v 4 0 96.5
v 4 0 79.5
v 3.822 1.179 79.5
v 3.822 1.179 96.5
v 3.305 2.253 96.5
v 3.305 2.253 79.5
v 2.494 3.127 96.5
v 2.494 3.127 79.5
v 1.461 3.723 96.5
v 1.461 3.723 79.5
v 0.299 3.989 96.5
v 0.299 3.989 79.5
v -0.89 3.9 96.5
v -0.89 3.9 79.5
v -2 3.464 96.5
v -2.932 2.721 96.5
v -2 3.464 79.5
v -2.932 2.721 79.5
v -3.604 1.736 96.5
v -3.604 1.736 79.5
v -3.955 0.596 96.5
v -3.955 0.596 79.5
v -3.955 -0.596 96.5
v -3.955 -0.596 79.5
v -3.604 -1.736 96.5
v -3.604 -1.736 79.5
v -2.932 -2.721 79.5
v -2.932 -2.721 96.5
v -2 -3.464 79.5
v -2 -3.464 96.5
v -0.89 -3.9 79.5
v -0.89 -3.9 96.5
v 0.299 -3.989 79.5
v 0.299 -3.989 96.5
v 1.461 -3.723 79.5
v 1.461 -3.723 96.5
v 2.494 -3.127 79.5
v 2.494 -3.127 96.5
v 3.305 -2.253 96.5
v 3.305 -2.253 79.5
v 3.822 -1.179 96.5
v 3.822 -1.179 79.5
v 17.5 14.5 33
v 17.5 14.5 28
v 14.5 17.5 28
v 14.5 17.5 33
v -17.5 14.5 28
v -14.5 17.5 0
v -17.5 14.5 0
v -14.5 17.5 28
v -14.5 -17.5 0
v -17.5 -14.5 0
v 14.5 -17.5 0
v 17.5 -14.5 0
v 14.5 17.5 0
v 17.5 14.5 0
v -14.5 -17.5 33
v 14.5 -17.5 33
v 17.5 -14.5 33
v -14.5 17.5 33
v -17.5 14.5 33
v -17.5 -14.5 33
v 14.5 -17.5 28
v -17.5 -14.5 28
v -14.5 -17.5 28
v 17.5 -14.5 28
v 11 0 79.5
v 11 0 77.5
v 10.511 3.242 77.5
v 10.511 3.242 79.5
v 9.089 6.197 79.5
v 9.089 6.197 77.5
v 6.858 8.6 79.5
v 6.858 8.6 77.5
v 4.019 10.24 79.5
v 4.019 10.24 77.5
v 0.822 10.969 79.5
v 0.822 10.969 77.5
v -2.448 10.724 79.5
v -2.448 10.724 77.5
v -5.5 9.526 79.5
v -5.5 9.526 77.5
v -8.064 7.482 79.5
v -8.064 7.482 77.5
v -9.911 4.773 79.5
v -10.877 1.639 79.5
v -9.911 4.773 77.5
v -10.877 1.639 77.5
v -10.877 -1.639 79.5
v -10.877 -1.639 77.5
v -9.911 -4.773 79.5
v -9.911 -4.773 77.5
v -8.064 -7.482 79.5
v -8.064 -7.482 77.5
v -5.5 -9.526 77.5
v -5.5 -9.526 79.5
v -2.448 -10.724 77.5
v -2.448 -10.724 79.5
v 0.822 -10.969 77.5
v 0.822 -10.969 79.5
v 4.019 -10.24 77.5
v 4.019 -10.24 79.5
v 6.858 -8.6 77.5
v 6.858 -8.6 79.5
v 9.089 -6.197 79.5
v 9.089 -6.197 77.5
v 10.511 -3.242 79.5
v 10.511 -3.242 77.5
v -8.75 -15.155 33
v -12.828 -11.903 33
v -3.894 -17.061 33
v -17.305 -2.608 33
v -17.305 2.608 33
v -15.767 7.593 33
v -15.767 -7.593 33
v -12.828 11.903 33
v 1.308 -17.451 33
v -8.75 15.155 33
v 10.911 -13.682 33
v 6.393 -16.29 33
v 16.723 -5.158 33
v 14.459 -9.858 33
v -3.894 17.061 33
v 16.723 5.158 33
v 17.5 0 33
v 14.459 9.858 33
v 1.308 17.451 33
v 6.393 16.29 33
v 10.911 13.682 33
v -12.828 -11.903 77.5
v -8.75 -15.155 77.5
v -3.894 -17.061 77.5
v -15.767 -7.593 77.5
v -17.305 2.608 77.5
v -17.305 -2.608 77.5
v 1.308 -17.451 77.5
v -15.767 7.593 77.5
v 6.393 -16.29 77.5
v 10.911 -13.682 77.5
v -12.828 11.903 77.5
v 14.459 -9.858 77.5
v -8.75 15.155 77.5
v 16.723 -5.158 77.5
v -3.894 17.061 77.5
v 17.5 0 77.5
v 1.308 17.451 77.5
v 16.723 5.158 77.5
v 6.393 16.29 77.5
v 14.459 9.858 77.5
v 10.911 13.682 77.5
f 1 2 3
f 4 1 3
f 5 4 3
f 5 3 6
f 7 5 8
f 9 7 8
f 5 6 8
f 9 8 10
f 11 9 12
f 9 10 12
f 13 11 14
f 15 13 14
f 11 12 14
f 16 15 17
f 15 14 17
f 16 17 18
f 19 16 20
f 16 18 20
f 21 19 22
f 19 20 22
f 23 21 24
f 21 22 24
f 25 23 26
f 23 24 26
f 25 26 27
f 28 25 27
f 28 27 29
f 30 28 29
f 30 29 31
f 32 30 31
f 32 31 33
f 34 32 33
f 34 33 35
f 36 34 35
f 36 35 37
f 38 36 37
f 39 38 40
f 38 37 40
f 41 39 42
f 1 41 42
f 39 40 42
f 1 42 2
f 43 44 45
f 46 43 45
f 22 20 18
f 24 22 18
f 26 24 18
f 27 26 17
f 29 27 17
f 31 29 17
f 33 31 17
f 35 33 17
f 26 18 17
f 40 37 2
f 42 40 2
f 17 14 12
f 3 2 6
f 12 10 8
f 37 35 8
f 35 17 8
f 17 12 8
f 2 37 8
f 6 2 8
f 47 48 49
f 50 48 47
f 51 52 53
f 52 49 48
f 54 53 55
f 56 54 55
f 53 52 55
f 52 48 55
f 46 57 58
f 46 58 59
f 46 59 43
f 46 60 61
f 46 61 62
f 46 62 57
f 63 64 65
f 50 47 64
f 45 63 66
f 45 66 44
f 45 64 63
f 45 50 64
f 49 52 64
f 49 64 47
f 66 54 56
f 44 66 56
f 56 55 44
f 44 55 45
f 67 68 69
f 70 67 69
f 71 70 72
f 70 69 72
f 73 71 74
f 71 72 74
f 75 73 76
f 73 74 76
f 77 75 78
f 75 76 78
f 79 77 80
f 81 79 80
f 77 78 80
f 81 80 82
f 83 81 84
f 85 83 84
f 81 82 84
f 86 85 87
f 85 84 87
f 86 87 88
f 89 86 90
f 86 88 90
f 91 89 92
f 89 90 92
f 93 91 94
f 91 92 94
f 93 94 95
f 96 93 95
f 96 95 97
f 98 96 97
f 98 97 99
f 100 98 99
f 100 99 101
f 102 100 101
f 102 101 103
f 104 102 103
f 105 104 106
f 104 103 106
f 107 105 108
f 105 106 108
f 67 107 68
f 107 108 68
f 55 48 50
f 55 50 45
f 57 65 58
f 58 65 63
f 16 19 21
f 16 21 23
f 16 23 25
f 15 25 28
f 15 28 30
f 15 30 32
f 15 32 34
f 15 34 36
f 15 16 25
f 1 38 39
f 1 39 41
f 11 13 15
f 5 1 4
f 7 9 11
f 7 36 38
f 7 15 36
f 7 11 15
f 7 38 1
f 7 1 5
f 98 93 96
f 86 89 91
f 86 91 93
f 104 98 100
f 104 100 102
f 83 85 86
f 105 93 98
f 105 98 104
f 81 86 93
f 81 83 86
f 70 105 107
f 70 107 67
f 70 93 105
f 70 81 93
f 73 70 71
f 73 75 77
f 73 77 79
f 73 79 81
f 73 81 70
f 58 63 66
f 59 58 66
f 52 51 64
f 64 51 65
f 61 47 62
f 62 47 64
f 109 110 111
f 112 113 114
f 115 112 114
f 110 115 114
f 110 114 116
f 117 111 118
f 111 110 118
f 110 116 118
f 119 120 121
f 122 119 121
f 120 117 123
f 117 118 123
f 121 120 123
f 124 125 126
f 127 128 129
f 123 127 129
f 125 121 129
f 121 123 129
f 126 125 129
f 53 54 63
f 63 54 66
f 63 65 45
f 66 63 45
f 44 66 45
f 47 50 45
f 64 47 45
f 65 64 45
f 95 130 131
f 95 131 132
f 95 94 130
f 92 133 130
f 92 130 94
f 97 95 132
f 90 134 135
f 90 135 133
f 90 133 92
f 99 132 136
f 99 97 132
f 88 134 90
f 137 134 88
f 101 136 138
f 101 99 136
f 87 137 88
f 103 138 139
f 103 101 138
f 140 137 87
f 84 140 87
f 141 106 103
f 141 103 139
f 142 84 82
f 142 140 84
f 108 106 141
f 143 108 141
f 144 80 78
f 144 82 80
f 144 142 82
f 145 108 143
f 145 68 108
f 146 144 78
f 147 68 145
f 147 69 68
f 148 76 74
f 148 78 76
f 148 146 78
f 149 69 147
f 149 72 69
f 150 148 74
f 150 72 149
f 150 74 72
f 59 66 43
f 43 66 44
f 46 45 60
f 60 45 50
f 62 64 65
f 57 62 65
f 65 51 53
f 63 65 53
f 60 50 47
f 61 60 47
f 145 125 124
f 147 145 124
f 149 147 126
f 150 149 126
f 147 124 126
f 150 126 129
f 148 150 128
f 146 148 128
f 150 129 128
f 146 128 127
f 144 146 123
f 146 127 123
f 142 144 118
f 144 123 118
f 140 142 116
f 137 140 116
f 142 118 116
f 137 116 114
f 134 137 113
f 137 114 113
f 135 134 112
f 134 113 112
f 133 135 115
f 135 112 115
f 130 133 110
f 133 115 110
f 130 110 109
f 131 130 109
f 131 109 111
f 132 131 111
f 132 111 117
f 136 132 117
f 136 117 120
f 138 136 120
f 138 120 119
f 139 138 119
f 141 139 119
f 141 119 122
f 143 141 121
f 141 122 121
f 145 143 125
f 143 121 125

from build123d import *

# Parameters (mm, degrees)
SKETCH1_W           = 35
SKETCH1_H           = 35
BOSS_EXTRUDE1_DEPTH = 28
CHAMFER1_SIZE       = 3
BOSS_EXTRUDE2_DEPTH = 5
SKETCH3_R           = 17.5
BOSS_EXTRUDE3_DEPTH = 44.5
SKETCH4_R           = 11
BOSS_EXTRUDE4_DEPTH = 2
SKETCH5_R           = 4
BOSS_EXTRUDE5_DEPTH = 17


with BuildPart() as part:
    # Sketch1 → Boss-Extrude1 (new body)
    with BuildSketch(Plane.XY):
        Rectangle(SKETCH1_W, SKETCH1_H)
    extrude(amount=BOSS_EXTRUDE1_DEPTH)

    # Chamfer1
    chamfer1_edges = [part.edges().sort_by_distance(p)[0] for p in [
        (17.5, -17.5, 14),
        (-17.5, -17.5, 14),
        (-17.5, 17.5, 14),
        (17.5, 17.5, 14),
    ]]
    chamfer(chamfer1_edges, length=CHAMFER1_SIZE)


with BuildPart() as body_2:
    # Sketch2 → Boss-Extrude2 (new body)
    with BuildSketch(Plane.XY.offset(28)):
        Polygon((-14.5, -17.5), (14.5, -17.5), (17.5, -14.5), (17.5, 14.5), (14.5, 17.5), (-14.5, 17.5), (-17.5, 14.5), (-17.5, -14.5), align=None)
    extrude(amount=BOSS_EXTRUDE2_DEPTH)


with BuildPart() as body_3:
    # Sketch3 → Boss-Extrude3 (new body)
    with BuildSketch(Plane.XY.offset(33)):
        Circle(SKETCH3_R)
    extrude(amount=BOSS_EXTRUDE3_DEPTH)

    # Sketch4 → Boss-Extrude4 (add)
    with BuildSketch(Plane.XY.offset(77.5)):
        Circle(SKETCH4_R)
    extrude(amount=BOSS_EXTRUDE4_DEPTH)


with BuildPart() as body_4:
    # Sketch5 → Boss-Extrude5 (new body)
    with BuildSketch(Plane.XY.offset(79.5)):
        Circle(SKETCH5_R)
    extrude(amount=BOSS_EXTRUDE5_DEPTH)


solid = Compound([part.part, body_2.part, body_3.part, body_4.part])
